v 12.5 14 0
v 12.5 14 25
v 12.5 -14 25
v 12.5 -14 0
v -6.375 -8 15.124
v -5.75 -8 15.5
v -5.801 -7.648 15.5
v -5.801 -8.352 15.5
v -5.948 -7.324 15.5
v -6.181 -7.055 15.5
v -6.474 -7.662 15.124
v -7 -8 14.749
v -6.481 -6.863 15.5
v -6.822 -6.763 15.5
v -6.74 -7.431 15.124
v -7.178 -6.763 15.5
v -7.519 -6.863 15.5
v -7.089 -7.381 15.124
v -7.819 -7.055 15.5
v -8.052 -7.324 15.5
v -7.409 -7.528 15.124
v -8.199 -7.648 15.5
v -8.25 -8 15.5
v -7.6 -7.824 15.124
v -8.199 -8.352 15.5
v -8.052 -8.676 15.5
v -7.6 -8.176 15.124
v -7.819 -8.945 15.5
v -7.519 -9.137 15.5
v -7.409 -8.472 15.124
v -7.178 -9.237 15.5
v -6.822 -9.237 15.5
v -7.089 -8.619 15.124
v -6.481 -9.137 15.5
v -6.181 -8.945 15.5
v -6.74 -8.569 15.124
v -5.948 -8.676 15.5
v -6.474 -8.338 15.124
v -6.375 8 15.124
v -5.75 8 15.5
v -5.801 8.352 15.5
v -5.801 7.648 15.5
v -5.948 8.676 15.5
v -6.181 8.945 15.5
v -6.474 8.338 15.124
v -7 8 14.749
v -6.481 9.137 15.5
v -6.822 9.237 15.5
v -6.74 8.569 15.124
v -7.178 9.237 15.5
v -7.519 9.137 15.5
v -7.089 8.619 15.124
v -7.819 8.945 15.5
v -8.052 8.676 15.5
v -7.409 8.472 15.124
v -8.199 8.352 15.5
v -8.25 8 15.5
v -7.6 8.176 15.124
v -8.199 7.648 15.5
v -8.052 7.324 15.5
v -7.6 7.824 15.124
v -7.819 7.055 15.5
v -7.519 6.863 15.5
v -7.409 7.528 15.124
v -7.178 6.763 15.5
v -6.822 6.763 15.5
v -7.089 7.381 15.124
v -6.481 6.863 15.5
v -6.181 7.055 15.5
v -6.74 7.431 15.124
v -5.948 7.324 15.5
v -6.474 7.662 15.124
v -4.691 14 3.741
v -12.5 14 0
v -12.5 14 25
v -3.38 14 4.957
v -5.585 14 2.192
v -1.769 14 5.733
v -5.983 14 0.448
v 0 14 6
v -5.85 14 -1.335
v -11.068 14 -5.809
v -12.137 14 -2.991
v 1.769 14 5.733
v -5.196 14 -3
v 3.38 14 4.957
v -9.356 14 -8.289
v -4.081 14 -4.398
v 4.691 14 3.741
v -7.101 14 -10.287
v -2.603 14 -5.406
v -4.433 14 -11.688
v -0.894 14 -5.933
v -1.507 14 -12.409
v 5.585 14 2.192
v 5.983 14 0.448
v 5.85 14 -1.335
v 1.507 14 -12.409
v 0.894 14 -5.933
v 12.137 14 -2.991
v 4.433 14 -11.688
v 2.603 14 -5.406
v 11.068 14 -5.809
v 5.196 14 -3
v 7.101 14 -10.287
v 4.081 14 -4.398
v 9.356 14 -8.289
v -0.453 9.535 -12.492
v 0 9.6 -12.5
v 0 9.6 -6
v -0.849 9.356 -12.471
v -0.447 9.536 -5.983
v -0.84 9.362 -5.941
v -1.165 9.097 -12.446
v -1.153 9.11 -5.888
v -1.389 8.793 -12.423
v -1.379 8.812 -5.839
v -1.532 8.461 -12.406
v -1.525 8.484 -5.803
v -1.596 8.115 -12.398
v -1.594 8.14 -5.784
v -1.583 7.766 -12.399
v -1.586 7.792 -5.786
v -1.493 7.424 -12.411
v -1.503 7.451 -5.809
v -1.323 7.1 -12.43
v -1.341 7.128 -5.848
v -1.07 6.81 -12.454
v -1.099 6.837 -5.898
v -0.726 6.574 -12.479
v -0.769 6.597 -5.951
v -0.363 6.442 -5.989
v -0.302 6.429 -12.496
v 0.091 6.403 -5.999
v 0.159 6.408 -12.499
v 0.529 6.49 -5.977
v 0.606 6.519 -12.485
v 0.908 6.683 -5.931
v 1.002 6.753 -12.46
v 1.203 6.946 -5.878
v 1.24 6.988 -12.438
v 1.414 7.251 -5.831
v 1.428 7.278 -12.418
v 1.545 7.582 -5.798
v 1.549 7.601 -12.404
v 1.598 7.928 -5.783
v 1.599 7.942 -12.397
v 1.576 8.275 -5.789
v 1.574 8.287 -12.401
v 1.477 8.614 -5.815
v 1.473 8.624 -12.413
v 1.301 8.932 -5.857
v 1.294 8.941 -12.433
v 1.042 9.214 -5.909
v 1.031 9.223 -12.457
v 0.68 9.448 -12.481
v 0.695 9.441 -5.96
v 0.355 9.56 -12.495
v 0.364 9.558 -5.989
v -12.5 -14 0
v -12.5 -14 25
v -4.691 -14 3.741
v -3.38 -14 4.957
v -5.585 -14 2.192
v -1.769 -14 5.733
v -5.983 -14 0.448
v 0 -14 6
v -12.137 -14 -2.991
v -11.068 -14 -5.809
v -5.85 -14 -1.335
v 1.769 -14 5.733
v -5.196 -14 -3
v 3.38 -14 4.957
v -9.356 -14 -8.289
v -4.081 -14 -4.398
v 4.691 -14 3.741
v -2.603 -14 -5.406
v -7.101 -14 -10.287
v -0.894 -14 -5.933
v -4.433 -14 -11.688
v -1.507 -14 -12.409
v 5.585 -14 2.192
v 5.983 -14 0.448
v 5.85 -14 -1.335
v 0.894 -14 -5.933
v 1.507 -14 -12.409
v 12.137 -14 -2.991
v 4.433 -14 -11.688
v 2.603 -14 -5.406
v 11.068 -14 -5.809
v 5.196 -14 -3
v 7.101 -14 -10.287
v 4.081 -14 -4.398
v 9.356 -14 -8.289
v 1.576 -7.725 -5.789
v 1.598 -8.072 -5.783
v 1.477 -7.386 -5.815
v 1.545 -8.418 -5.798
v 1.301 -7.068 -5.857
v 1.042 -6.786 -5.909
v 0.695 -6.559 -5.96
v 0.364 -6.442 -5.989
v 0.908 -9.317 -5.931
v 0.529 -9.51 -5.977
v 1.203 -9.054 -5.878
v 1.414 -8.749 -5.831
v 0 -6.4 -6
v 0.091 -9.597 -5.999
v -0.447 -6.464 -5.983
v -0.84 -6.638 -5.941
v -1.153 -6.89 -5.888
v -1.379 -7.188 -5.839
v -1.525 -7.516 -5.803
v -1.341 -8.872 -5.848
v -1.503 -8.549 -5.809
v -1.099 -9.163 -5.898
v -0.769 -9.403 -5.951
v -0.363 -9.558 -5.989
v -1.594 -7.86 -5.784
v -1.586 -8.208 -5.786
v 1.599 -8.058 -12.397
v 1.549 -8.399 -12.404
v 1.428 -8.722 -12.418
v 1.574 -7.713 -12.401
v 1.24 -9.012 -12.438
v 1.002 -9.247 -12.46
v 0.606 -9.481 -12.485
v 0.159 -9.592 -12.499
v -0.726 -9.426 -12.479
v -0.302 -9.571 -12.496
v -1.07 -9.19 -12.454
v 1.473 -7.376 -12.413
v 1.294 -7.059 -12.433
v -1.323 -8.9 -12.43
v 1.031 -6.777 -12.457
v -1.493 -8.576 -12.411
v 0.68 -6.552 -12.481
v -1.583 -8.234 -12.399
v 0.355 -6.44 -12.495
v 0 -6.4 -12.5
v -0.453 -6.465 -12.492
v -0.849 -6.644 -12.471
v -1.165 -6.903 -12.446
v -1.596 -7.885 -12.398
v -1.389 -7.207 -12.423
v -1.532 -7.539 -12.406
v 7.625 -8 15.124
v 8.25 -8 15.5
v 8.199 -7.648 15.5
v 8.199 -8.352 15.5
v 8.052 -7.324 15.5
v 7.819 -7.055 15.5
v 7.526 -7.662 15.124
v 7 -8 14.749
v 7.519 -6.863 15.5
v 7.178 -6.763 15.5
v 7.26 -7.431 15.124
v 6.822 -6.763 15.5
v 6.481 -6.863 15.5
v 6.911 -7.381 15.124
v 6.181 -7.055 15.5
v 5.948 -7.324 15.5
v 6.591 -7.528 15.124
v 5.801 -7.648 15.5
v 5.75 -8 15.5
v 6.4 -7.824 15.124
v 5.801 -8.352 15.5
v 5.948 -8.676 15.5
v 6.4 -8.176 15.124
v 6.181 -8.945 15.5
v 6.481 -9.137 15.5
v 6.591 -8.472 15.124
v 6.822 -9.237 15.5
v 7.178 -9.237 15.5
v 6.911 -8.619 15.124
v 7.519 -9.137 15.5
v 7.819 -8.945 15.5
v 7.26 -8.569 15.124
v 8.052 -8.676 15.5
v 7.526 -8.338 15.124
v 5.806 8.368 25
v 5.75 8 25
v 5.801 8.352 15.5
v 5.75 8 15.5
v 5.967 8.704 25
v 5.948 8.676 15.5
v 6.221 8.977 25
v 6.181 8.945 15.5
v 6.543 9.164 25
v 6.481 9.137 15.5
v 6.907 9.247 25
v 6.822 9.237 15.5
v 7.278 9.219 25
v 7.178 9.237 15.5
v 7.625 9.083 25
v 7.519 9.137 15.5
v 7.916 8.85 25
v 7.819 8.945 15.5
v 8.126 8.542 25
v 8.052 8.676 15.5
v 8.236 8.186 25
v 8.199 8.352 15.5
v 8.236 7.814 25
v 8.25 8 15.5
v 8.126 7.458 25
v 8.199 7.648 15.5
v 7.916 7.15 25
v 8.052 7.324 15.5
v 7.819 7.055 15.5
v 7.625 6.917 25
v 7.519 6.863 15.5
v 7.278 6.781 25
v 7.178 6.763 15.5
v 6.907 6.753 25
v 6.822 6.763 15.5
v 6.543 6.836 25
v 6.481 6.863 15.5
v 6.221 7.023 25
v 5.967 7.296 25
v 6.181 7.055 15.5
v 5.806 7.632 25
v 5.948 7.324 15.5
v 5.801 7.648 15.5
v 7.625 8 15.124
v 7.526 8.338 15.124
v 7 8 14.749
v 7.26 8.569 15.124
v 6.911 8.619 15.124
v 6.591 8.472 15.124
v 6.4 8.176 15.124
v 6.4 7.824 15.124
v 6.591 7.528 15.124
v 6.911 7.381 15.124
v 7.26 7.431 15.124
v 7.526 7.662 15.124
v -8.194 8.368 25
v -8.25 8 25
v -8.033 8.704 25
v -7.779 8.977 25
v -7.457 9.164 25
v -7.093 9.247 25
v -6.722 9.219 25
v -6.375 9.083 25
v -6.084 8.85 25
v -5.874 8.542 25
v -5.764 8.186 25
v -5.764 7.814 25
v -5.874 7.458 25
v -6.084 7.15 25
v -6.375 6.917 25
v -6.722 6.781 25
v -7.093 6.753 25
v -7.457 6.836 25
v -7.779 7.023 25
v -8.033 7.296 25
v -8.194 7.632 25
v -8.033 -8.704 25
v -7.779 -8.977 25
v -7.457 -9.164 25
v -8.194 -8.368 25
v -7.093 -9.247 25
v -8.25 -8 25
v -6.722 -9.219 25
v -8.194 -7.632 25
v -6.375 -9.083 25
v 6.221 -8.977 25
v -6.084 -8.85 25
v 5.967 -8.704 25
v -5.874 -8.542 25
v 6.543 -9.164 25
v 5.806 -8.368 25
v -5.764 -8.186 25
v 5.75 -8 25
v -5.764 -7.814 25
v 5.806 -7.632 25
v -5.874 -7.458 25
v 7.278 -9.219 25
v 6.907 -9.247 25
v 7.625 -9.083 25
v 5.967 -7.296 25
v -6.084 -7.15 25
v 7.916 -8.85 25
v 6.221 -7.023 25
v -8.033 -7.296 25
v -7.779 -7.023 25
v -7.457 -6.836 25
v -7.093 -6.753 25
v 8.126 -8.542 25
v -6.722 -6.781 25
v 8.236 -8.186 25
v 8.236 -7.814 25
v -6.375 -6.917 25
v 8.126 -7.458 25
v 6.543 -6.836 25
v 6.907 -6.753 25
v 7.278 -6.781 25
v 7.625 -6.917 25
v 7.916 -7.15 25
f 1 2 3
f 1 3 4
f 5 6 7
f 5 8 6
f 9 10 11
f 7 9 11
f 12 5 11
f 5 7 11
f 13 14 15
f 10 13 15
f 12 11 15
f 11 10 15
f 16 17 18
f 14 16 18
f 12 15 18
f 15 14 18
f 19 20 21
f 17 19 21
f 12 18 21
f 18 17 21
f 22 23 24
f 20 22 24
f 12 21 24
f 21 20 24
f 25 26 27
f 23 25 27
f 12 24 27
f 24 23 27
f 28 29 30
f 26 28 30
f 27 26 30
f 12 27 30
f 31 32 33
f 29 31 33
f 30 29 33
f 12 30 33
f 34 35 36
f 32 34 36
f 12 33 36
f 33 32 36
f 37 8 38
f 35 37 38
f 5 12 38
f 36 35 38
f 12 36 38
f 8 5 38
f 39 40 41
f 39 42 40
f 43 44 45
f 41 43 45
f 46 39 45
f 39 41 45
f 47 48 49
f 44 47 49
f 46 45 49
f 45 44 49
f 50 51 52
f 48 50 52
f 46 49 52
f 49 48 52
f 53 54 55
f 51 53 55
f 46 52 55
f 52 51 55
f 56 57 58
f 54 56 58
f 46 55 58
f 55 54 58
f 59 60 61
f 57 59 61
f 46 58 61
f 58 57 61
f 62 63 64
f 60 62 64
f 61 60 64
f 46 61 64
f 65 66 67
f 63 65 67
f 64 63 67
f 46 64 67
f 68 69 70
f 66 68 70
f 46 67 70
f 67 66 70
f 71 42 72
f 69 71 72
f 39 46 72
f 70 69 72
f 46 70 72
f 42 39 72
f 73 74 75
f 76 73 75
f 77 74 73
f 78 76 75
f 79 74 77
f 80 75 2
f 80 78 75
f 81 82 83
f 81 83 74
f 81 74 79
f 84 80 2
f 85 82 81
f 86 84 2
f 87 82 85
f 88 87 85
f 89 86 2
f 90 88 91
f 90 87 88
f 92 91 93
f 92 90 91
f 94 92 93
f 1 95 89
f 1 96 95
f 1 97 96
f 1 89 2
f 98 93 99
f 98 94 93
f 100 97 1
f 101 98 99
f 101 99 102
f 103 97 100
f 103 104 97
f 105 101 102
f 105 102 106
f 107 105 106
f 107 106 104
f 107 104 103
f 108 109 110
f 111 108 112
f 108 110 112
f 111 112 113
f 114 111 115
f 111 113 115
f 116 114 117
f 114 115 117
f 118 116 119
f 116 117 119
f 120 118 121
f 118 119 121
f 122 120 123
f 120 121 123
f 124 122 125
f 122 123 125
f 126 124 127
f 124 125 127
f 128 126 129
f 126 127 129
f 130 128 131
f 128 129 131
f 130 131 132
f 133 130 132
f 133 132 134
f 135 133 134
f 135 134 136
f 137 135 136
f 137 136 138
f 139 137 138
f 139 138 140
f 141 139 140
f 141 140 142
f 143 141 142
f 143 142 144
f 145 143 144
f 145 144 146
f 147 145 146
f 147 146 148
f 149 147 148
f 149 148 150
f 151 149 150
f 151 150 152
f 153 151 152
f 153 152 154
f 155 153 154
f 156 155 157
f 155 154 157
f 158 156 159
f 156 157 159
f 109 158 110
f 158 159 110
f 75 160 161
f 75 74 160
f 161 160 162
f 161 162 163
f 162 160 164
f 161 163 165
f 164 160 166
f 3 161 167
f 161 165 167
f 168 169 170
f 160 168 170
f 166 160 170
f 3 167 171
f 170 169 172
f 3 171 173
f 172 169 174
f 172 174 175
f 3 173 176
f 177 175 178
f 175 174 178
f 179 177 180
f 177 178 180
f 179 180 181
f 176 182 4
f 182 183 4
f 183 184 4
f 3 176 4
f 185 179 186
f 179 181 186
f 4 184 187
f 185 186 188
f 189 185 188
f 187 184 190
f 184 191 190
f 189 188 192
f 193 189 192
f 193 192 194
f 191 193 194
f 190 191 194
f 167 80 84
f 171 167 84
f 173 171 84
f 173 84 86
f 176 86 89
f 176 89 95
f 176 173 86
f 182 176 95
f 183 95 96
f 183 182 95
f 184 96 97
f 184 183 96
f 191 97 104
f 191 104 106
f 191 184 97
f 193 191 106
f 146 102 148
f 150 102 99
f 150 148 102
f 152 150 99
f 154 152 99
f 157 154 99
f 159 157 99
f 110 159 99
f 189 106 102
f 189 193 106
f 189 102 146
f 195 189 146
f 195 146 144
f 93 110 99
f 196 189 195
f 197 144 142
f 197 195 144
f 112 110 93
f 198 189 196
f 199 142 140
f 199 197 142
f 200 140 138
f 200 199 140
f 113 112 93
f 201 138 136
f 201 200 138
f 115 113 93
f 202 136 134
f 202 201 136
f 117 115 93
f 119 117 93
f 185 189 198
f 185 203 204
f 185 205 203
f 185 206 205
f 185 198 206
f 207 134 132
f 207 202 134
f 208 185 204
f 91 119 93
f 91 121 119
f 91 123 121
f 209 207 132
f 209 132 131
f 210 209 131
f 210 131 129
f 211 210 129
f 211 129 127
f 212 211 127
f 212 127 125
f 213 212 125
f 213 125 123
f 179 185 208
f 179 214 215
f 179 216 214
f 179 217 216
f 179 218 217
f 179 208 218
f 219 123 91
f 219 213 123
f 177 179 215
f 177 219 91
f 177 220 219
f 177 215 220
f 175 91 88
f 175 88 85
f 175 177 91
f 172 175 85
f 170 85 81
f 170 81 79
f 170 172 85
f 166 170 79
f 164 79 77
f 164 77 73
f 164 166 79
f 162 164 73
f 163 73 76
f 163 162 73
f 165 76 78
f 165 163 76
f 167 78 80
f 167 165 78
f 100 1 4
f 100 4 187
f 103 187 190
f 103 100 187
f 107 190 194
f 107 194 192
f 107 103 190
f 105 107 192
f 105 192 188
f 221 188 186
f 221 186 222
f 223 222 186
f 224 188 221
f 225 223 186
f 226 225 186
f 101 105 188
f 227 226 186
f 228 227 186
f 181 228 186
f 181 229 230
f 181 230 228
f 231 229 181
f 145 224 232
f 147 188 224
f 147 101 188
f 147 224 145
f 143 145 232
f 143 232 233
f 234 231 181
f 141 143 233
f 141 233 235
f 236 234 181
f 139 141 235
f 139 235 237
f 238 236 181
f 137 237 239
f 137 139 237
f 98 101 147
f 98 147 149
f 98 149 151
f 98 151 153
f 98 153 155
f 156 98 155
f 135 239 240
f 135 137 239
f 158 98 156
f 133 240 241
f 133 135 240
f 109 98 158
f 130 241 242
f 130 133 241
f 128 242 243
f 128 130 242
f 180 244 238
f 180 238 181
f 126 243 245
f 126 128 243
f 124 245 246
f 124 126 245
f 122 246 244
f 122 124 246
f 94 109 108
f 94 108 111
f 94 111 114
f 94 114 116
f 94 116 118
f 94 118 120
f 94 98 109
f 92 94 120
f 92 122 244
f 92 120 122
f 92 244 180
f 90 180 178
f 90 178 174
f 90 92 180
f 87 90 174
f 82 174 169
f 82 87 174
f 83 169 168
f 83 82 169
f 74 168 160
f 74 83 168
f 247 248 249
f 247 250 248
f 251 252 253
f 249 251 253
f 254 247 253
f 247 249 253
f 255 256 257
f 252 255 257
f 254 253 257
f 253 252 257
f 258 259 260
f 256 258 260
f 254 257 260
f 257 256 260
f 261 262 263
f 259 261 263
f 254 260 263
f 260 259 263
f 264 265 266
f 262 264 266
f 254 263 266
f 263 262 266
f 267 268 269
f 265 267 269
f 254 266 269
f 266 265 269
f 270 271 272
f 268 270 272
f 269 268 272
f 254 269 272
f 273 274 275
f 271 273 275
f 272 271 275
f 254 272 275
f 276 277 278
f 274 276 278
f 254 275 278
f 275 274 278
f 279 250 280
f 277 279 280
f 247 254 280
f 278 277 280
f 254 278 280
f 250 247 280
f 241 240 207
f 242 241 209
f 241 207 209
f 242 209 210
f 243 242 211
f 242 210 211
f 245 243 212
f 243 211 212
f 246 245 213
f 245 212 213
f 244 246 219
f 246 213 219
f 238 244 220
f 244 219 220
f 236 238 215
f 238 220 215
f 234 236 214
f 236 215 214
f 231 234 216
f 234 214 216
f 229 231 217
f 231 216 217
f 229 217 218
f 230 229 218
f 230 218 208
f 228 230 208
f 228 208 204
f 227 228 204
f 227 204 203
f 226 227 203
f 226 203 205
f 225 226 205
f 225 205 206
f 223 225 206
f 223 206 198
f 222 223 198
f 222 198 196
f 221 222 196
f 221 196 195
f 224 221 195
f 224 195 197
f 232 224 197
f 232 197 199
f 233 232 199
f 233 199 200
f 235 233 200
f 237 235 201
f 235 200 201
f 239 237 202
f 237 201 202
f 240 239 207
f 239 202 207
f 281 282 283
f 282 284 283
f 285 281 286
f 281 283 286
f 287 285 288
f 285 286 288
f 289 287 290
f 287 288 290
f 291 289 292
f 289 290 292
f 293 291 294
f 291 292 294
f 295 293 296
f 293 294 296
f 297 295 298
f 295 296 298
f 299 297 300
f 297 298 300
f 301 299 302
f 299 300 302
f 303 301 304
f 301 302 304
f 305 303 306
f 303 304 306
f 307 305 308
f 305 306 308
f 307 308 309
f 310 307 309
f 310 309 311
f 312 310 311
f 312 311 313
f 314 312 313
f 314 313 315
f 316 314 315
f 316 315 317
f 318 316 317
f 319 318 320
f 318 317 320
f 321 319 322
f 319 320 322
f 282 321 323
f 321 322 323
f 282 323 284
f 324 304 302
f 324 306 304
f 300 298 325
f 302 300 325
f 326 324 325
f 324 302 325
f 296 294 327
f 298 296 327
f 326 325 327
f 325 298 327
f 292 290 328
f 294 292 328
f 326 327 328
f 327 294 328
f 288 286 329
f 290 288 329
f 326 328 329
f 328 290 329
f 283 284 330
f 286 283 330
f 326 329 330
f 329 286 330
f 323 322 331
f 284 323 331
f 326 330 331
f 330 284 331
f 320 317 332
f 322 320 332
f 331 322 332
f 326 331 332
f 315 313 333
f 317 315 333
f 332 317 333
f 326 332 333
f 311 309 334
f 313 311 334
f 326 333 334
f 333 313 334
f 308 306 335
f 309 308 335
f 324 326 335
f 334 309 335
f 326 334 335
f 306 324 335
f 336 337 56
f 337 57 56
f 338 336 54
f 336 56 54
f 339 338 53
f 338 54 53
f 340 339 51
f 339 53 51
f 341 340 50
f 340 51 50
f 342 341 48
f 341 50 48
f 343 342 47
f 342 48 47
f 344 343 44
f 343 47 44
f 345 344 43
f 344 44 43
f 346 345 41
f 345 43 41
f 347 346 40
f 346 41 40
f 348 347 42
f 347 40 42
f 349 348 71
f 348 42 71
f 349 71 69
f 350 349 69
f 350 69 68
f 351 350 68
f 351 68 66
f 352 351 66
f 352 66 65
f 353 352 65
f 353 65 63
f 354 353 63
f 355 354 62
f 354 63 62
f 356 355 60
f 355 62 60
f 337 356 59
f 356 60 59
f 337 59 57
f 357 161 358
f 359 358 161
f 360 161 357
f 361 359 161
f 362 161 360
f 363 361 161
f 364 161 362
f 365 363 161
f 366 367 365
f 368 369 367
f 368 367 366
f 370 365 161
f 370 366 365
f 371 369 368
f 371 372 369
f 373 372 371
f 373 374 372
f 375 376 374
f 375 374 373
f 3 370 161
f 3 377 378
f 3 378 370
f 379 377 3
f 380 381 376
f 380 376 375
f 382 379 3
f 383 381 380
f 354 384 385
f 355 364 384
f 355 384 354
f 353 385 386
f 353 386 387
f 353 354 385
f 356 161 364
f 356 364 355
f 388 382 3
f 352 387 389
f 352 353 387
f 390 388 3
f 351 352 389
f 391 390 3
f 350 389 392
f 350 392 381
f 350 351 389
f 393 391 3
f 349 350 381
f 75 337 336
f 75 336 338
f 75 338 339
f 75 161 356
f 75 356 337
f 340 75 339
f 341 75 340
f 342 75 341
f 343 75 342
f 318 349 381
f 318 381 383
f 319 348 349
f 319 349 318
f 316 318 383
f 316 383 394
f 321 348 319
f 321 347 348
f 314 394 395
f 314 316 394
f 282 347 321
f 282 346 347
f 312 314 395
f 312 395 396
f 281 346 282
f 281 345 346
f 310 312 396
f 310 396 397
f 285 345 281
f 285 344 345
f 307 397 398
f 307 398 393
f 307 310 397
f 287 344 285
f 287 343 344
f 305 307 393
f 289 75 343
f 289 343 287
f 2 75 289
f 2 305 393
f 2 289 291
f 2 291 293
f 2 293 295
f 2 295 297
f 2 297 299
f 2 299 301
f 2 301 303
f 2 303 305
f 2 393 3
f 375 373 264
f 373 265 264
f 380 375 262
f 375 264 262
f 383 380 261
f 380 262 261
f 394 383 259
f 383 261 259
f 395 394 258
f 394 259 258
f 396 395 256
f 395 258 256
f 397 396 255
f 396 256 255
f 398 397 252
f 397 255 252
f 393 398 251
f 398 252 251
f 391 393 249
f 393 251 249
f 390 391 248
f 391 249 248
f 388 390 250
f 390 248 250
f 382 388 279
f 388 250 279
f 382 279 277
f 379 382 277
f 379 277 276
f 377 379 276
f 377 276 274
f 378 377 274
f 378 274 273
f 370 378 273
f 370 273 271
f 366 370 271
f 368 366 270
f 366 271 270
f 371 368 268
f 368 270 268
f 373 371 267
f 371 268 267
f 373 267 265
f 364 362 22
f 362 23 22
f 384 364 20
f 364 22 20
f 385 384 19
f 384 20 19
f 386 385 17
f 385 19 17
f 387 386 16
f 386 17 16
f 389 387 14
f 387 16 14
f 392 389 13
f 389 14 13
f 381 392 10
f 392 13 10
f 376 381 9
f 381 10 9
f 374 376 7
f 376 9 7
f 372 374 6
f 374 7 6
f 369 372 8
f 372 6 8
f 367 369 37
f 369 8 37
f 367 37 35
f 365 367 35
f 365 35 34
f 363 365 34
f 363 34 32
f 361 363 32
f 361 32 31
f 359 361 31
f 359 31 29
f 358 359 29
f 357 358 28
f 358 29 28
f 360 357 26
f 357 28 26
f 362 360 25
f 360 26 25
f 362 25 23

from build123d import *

# Parameters (mm, degrees)
SKETCH_1_R             = 6
EXTRUDE_1_DEPTH        = 14
SKETCH_7_R             = 1.6
CUT_EXTRUDE_2_DEPTH    = 32.260998065
HOLE_WIZARD_M3_1_D     = 2.5
HOLE_WIZARD_M3_1_DEPTH = 9.5
HOLE_WIZARD_M3_1_TIP   = 0.751075774


with BuildPart() as part:
    # 草图1 → 凸台-拉伸1 (new, symmetric)
    with BuildSketch(Plane(origin=(0, 0, 0), x_dir=(1, 0, 0), z_dir=(0, 1, 0))):
        with BuildLine():
            Line((-12.5, -25), (12.5, -25))
            Line((12.5, -25), (12.5, 0))
            ThreePointArc((12.5, 0), (0, 12.5), (-12.5, 0))
            Line((-12.5, 0), (-12.5, -25))
        make_face()
        with Locations(Location((0, 0, 0), (0, 0, 270))):
            Circle(SKETCH_1_R, mode=Mode.SUBTRACT)
    extrude(amount=EXTRUDE_1_DEPTH, both=True)

    # 草图7 → 切除-拉伸2 (cut, through all)
    with BuildSketch(Plane.XY):
        with Locations(Location((0, -8, 0), (0, 0, 90))):
            Circle(SKETCH_7_R)
        with Locations(Location((0, 8, 0), (0, 0, 90))):
            Circle(SKETCH_7_R)
    extrude(amount=-CUT_EXTRUDE_2_DEPTH, mode=Mode.SUBTRACT)

    # M3 螺纹孔1
    with Locations(Plane(origin=(-7, -8, 25), x_dir=(1, 0, 0), z_dir=(0, 0, 1))):
        with Locations((0, 0), (14, 0), (14, 16), (0, 16)):
            Hole(HOLE_WIZARD_M3_1_D / 2, depth=HOLE_WIZARD_M3_1_DEPTH)
            with Locations((0, 0, -(HOLE_WIZARD_M3_1_DEPTH + HOLE_WIZARD_M3_1_TIP / 2))):  # 118° drill point
                Cone(0, HOLE_WIZARD_M3_1_D / 2, HOLE_WIZARD_M3_1_TIP, mode=Mode.SUBTRACT)


solid = part.part
